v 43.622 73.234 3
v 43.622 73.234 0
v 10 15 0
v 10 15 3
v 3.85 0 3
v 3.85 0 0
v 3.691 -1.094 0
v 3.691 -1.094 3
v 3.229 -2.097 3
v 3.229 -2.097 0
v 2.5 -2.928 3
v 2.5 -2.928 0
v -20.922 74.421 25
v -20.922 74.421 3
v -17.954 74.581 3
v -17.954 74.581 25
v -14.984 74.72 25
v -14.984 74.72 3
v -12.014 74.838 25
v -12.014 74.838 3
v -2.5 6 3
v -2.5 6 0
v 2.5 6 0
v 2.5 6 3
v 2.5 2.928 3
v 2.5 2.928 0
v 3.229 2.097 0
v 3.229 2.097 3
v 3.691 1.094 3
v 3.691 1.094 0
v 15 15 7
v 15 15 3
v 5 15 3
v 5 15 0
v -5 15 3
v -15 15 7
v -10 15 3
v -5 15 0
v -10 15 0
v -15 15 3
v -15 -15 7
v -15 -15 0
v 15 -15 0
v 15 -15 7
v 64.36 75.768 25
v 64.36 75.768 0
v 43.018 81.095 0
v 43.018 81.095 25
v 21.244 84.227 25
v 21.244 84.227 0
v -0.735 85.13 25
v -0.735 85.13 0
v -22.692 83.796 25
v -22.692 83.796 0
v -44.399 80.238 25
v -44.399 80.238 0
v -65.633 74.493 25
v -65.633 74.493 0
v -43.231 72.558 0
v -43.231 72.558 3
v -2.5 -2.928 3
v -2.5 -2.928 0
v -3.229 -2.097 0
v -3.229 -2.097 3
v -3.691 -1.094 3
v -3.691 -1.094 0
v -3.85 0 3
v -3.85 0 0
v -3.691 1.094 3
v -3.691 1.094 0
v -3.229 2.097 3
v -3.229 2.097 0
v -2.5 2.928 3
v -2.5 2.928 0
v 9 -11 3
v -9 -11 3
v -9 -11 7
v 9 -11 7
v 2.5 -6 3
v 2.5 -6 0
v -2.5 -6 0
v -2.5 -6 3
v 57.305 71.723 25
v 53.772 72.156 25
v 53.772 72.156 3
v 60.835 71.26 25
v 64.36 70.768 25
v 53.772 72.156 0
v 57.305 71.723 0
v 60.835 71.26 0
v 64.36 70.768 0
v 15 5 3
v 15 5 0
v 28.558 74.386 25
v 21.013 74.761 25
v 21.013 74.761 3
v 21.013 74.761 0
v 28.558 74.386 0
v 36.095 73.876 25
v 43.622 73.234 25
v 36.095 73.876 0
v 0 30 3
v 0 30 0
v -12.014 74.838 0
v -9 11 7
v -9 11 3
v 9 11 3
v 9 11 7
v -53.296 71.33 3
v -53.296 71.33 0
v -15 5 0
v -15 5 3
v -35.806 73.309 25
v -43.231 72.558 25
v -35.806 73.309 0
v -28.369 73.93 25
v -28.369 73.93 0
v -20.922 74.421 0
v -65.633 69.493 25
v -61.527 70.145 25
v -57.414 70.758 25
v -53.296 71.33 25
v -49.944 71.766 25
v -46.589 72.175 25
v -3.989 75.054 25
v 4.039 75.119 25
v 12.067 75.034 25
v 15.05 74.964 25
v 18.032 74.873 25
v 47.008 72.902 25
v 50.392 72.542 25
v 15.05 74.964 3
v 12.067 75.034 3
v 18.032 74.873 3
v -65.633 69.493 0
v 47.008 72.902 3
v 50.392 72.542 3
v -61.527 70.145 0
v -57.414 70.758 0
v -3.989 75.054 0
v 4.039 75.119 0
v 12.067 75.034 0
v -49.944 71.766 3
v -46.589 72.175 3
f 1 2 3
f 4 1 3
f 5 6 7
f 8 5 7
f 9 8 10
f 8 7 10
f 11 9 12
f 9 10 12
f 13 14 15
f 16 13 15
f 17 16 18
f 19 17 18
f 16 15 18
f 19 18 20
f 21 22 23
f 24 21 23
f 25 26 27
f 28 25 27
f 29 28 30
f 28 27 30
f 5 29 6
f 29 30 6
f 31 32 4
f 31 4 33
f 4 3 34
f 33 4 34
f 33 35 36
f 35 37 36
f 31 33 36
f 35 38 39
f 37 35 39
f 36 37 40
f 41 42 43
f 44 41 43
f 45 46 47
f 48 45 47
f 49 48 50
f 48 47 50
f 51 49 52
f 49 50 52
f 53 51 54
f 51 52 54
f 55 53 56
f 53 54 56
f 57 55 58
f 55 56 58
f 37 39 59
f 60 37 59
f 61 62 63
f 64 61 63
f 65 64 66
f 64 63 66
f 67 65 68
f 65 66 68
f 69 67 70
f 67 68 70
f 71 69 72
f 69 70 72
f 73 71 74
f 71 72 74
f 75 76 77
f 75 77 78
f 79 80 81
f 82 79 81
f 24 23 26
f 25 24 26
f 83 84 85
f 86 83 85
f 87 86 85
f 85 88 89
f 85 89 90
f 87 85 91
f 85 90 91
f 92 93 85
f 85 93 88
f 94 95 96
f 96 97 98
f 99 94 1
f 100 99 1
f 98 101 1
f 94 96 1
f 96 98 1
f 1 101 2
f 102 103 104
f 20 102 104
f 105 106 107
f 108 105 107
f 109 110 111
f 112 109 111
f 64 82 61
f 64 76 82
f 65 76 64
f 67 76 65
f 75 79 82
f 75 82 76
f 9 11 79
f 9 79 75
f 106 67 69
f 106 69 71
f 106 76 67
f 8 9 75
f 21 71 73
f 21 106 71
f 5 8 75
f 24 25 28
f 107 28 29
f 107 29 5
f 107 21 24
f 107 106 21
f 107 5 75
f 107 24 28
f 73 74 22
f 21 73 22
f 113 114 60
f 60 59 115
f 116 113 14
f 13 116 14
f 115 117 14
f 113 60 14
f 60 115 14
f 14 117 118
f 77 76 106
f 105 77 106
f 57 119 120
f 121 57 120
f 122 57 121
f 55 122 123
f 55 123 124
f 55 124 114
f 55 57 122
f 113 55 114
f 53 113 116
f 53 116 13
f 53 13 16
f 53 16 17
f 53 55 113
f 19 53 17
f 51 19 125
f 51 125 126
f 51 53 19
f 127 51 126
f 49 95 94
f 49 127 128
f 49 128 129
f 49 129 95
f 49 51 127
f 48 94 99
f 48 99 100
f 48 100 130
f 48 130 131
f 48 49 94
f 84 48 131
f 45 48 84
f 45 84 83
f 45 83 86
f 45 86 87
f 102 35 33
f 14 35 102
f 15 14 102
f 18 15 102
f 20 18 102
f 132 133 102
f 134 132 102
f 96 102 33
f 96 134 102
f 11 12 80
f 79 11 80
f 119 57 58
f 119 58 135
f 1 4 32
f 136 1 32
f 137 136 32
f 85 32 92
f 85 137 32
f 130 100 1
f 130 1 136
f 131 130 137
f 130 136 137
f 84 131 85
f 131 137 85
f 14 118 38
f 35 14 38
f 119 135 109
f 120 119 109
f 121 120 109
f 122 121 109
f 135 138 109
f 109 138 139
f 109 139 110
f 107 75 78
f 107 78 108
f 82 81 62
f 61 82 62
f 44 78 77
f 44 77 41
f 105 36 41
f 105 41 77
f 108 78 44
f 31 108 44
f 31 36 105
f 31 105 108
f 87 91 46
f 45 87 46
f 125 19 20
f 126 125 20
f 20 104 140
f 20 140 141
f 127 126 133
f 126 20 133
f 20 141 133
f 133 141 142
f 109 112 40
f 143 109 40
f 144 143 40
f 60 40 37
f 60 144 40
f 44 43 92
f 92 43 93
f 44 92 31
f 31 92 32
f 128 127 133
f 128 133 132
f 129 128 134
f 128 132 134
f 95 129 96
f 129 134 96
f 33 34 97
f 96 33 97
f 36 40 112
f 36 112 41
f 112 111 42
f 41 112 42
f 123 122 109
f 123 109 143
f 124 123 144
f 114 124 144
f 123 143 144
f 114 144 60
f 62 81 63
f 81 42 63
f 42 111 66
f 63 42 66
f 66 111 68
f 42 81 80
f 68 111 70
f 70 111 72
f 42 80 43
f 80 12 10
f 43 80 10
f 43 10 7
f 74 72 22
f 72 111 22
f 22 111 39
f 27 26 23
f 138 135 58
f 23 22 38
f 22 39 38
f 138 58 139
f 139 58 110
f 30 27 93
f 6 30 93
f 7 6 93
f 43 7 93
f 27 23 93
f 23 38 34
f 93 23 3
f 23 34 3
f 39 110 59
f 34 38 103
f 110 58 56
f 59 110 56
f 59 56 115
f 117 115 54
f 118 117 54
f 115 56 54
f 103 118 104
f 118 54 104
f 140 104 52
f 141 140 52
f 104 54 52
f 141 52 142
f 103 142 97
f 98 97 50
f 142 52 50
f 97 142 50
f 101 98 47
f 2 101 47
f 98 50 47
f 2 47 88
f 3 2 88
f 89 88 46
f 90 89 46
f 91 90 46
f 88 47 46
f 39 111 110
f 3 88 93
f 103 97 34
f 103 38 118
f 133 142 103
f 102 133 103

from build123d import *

# Parameters (mm, degrees)
F0_W     = 18
F0_H     = 22
F1_DEPTH = 7
F2_DEPTH = 3
F3_DEPTH = 3
F4_DEPTH = 25


with BuildPart() as f1:
    # F0 (on Top) → F1 (new body)
    with BuildSketch(Plane.XY):
        Polygon((15, 5), (15, 15), (10, 15), (5, 15), (-5, 15), (-10, 15), (-15, 15), (-15, 5), (-15, -15), (15, -15), align=None)
        Rectangle(F0_W, F0_H, mode=Mode.SUBTRACT)
    extrude(amount=F1_DEPTH)

    # F0 (on Top) → F2 (join)
    with BuildSketch(Plane.XY):
        Rectangle(F0_W, F0_H)
        with BuildLine():
            ThreePointArc((2.5, 2.927883), (3.496248, 1.612064), (3.85, 0))
            ThreePointArc((3.85, 0), (3.496248, -1.612064), (2.5, -2.927883))
            Line((2.5, -2.927883), (2.5, -6))
            Line((2.5, -6), (-2.5, -6))
            Line((-2.5, -6), (-2.5, -2.927883))
            ThreePointArc((-2.5, -2.927883), (-3.85, 0), (-2.5, 2.927883))
            Line((-2.5, 2.927883), (-2.5, 6))
            Line((-2.5, 6), (2.5, 6))
            Line((2.5, 6), (2.5, 2.927883))
        make_face(mode=Mode.SUBTRACT)
    extrude(amount=F2_DEPTH)

    # F0 (on Top) → F3 (join)
    with BuildSketch(Plane.XY):
        with BuildLine():
            Line((-15, 15), (-10, 15))
            Line((-10, 15), (-43.230891, 72.557591))
            ThreePointArc((-43.230891, 72.557591), (-48.26689, 71.973599), (-53.295612, 71.329946))
            Line((-53.295612, 71.329946), (-15, 5))
            Line((-15, 5), (-15, 15))
        make_face()
        with BuildLine():
            Line((-5, 15), (5, 15))
            Line((5, 15), (21.013009, 74.761364))
            ThreePointArc((21.013009, 74.761364), (16.540642, 74.921132), (12.066847, 75.034088))
            Line((12.066847, 75.034088), (0, 30))
            Line((0, 30), (-12.014256, 74.837814))
            ThreePointArc((-12.014256, 74.837814), (-16.469144, 74.652721), (-20.92186, 74.42119))
            Line((-20.92186, 74.42119), (-5, 15))
        make_face()
        with BuildLine():
            Line((10, 15), (15, 15))
            Line((15, 15), (15, 5))
            Line((15, 5), (53.772336, 72.155656))
            ThreePointArc((53.772336, 72.155656), (48.700199, 72.725298), (43.621624, 73.234362))
            Line((43.621624, 73.234362), (10, 15))
        make_face()
    extrude(amount=F3_DEPTH)

    # F0 (on Top) → F4 (join)
    with BuildSketch(Plane.XY):
        with BuildLine():
            ThreePointArc((21.013009, 74.761364), (32.327433, 74.147641), (43.621624, 73.234362))
            ThreePointArc((43.621624, 73.234362), (48.700199, 72.725298), (53.772336, 72.155656))
            ThreePointArc((53.772336, 72.155656), (59.070627, 71.495011), (64.360257, 70.768265))
            Line((64.360257, 70.768265), (64.360257, 75.768265))
            ThreePointArc((64.360257, 75.768265), (-0.734726, 85.130056), (-65.633486, 74.49281))
            Line((-65.633486, 74.49281), (-65.633486, 69.49281))
            ThreePointArc((-65.633486, 69.49281), (-59.471248, 70.456366), (-53.295612, 71.329946))
            ThreePointArc((-53.295612, 71.329946), (-48.26689, 71.973599), (-43.230891, 72.557591))
            ThreePointArc((-43.230891, 72.557591), (-32.088572, 73.6354), (-20.92186, 74.42119))
            ThreePointArc((-20.92186, 74.42119), (-16.469144, 74.652721), (-12.014256, 74.837814))
            ThreePointArc((-12.014256, 74.837814), (0.024914, 75.105497), (12.066847, 75.034088))
            ThreePointArc((12.066847, 75.034088), (16.540642, 74.921132), (21.013009, 74.761364))
        make_face()
    extrude(amount=F4_DEPTH)


solid = f1.part
